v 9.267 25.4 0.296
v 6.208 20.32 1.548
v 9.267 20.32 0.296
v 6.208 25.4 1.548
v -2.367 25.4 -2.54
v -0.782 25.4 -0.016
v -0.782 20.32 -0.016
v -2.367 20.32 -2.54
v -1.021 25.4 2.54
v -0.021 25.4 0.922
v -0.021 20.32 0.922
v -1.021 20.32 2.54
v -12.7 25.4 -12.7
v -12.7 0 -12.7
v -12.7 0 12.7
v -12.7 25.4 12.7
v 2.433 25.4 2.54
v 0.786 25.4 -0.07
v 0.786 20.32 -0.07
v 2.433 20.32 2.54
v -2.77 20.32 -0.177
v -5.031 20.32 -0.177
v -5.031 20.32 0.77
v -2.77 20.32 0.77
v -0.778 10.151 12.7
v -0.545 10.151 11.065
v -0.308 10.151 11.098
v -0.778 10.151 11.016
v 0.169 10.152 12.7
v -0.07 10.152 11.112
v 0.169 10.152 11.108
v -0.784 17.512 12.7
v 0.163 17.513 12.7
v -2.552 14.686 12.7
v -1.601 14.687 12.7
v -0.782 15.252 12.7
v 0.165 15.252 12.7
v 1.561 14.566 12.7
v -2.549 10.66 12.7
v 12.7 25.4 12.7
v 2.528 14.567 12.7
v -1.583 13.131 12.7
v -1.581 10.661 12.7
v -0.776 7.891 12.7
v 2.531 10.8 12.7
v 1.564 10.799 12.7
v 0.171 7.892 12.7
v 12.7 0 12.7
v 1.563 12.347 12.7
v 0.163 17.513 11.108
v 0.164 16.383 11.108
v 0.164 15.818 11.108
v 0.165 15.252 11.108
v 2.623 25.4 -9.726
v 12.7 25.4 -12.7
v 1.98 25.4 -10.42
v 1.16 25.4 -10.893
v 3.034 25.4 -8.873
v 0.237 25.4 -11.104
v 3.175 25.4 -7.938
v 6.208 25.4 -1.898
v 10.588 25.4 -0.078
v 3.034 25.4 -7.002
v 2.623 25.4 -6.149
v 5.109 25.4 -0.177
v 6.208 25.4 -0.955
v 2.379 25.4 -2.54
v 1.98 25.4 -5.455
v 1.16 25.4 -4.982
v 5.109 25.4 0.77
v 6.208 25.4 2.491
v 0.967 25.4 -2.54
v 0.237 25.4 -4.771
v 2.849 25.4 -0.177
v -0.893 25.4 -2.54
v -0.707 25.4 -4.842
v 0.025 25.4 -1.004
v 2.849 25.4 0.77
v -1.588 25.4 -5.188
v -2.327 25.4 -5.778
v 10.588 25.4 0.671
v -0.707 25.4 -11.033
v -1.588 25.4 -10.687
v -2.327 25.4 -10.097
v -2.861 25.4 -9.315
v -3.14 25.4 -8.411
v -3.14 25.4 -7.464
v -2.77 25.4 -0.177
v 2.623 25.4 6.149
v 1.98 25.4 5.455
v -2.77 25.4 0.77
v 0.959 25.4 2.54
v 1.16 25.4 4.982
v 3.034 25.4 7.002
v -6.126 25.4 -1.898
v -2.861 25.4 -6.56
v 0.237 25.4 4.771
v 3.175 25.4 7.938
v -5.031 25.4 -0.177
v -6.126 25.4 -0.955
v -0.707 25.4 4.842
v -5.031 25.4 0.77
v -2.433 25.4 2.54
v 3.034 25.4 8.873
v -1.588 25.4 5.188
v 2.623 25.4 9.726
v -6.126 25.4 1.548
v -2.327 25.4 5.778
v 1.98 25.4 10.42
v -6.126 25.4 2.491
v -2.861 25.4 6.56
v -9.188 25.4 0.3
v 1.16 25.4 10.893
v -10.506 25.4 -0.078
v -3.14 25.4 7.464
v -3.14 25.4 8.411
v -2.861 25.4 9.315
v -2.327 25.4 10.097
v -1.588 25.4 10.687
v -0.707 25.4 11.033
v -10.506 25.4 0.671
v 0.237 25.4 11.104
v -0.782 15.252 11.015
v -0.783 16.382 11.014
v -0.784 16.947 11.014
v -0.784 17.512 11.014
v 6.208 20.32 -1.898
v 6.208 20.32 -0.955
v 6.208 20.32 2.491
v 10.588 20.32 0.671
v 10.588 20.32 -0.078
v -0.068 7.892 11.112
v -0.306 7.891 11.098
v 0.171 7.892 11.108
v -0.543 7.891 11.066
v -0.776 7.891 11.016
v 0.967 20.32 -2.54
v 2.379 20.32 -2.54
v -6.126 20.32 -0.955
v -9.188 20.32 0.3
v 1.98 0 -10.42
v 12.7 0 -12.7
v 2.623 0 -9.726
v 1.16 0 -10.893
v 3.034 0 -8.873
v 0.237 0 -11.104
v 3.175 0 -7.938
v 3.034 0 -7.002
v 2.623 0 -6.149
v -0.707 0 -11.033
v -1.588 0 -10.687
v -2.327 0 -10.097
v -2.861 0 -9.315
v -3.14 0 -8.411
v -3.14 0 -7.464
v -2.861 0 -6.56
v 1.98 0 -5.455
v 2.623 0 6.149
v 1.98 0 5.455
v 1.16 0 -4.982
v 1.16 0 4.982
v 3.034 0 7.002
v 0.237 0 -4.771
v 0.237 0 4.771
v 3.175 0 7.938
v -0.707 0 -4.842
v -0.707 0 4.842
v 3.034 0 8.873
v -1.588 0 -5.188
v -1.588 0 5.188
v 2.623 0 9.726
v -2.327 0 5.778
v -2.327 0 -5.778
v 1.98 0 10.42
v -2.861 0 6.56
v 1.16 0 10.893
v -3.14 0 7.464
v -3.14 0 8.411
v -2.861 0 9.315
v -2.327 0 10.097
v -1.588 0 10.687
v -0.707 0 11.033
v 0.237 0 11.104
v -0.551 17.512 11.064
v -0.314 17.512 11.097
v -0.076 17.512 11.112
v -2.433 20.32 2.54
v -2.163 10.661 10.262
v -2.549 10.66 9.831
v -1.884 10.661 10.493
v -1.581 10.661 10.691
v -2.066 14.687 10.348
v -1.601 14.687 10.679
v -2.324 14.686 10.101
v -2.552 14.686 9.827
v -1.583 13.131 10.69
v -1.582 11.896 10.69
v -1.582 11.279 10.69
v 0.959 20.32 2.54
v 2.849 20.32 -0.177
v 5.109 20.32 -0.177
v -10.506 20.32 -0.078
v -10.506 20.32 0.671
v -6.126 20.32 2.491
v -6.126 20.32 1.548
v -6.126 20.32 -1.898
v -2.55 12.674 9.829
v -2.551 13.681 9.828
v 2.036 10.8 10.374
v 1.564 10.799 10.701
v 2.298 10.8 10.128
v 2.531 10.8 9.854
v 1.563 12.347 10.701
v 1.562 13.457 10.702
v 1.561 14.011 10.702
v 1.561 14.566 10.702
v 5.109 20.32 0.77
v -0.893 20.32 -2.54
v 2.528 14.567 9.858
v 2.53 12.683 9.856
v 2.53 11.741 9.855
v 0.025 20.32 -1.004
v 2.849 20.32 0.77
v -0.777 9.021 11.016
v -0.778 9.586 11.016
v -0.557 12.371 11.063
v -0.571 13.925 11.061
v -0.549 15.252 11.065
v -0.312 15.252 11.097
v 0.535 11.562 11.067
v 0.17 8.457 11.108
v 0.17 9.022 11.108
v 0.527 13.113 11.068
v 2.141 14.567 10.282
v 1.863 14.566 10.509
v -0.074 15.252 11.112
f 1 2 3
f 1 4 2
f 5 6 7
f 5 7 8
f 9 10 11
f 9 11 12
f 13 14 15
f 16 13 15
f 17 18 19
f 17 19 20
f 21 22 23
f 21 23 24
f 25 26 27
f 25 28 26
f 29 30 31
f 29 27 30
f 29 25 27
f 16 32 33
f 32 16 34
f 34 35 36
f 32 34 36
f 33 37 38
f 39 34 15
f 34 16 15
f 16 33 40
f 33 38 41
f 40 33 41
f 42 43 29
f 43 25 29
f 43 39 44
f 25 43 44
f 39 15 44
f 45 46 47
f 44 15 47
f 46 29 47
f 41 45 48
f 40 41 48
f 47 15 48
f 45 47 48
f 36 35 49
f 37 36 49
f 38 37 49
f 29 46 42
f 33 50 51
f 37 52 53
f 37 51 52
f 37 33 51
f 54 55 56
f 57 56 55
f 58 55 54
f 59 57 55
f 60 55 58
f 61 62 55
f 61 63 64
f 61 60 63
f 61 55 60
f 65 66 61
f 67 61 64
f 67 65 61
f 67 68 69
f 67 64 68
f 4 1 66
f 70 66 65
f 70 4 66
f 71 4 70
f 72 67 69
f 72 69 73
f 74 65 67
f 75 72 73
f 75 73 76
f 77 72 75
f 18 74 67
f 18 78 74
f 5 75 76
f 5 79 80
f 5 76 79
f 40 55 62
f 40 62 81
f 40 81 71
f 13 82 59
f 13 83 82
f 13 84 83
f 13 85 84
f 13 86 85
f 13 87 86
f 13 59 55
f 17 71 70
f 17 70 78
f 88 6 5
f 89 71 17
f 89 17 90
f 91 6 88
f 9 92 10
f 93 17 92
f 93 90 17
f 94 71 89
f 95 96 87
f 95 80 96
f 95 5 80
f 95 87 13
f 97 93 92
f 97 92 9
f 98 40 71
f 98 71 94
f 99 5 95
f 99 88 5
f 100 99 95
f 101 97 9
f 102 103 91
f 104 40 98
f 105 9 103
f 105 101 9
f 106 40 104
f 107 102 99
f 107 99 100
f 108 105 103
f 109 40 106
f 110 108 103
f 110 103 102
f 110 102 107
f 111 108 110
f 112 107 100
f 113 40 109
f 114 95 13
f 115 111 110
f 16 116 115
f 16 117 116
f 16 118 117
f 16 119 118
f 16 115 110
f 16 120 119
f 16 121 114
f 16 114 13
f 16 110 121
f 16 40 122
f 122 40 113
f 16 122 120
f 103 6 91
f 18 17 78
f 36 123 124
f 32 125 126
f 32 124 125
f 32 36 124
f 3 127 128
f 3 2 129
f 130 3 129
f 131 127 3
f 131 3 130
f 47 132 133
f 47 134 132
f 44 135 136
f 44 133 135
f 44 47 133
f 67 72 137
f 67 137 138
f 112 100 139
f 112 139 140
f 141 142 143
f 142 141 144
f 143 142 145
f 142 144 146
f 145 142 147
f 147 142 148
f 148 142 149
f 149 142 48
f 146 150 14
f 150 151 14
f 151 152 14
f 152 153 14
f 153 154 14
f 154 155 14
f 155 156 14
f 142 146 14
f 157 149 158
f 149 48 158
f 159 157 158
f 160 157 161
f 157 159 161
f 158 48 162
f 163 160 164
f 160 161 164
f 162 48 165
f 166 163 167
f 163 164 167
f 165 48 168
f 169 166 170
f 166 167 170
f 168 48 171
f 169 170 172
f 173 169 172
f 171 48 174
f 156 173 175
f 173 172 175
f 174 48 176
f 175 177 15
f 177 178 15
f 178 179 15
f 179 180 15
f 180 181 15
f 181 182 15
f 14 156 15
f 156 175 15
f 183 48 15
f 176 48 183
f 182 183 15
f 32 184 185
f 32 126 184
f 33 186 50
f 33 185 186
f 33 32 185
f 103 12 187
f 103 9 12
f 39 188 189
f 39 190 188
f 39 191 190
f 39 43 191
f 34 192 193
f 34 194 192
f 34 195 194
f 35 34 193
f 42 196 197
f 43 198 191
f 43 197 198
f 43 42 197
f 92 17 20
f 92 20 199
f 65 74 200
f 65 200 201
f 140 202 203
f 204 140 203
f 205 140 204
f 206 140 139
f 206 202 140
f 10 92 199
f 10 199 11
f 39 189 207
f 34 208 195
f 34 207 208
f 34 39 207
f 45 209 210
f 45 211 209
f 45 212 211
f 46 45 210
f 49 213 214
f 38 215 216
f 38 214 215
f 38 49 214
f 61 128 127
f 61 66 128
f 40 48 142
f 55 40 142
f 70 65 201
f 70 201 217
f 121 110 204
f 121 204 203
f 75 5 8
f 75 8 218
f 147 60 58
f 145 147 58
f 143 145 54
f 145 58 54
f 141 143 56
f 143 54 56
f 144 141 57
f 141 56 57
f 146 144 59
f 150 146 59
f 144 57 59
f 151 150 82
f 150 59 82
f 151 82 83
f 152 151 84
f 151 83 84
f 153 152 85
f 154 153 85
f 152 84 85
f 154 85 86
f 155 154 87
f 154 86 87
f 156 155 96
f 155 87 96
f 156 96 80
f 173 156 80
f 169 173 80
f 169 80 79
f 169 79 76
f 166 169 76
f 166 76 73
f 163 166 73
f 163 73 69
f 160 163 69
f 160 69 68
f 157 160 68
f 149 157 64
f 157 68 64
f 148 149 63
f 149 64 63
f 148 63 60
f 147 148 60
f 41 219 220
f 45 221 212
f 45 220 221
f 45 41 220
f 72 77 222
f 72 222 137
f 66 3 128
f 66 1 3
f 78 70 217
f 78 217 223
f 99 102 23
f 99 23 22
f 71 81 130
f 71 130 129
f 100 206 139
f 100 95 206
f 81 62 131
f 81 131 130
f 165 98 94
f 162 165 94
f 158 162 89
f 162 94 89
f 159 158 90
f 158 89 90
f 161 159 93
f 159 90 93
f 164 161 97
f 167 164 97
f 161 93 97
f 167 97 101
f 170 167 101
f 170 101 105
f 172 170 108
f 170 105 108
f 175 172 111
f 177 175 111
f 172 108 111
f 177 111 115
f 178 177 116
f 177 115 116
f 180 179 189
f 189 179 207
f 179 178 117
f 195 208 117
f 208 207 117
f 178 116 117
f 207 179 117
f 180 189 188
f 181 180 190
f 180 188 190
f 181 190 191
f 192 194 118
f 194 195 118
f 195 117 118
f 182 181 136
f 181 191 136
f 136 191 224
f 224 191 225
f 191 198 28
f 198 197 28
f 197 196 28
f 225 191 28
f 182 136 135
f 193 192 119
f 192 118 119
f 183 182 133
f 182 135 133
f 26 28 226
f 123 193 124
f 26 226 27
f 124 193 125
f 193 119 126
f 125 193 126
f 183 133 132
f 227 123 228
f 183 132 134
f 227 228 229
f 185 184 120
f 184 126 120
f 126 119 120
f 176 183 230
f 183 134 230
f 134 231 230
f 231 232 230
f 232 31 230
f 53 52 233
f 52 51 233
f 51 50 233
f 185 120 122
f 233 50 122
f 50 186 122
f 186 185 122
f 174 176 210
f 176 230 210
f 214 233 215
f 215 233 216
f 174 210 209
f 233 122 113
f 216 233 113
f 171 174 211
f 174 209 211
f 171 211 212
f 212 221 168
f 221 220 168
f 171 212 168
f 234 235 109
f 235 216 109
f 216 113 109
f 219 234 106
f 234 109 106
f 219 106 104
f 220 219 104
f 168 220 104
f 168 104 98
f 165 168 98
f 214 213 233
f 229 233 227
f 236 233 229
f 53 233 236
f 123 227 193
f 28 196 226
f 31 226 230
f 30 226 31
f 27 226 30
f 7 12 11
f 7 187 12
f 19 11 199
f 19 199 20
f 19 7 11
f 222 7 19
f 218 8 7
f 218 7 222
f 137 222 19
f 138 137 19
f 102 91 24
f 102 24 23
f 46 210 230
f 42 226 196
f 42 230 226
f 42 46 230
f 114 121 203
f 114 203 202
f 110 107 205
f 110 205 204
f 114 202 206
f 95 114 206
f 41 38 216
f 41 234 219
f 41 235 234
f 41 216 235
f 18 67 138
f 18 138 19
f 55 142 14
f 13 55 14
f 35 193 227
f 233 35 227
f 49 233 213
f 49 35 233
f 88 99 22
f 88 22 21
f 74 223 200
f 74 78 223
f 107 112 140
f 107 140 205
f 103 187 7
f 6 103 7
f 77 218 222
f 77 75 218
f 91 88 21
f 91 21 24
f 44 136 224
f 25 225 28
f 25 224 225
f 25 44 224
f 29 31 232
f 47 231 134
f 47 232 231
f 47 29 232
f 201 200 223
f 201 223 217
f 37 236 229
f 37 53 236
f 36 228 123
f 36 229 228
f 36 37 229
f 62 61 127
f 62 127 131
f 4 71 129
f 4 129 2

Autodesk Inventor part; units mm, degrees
ref_plane "YZ Plane" through (0, 0, 0) normal (1, 0, 0) x (0, 1, 0)
ref_plane "XZ Plane" through (0, 0, 0) normal (0, 1, 0) x (-1, 0, 0)
ref_plane "XY Plane" through (0, 0, 0) normal (0, 0, 1) x (1, 0, 0)
sketch "Sketch1" plane through (0, 0, 0) normal (0, 1, 0) x (-1, 0, 0)
  line L0 (12.7, 12.7) -> (-12.7, 12.7)
  line L1 (-12.7, 12.7) -> (-12.7, -12.7)
  line L2 (-12.7, -12.7) -> (12.7, -12.7)
  line L3 (12.7, -12.7) -> (12.7, 12.7)
  line L4 (12.7, 12.7) -> (-12.7, -12.7) construction
  line L5 (-12.7, 12.7) -> (12.7, -12.7) construction
  point P0 (0, 0)
  dimension "d0" = 25.4
  dimension "d1" = 25.4
extrude "Extrusion1" add sketch "Sketch1" along normal blind 25.4
sketch "Sketch2" plane through (0, 25.4, 0) normal (0, 1, 0) x (1, 0, 0)
  line L0 (-12.7, 12.7) -> (-12.7, -12.7) construction
  line L1 (-12.7, 0) -> (12.7, 0) construction
  line L2 (12.7, -12.7) -> (12.7, 12.7) construction
  line L3 (-6.1256, -2.4906) -> (-10.5058, -0.671)
  line L4 (-10.5058, -0.671) -> (-10.5058, 0.0782)
  line L5 (-10.5058, 0.0782) -> (-6.1256, 1.8978)
  line L6 (-6.1256, 1.8978) -> (-6.1256, 0.9551)
  line L7 (-6.1256, 0.9551) -> (-9.1885, -0.3005)
  line L8 (-9.1885, -0.3005) -> (-6.1256, -1.5479)
  line L9 (-6.1256, -1.5479) -> (-6.1256, -2.4906)
  line L10 (-2.7705, -0.7698) -> (-5.0306, -0.7698)
  line L11 (-5.0306, -0.7698) -> (-5.0306, 0.177)
  line L12 (-5.0306, 0.177) -> (-2.7705, 0.177)
  line L13 (-2.7705, 0.177) -> (-2.7705, -0.7698)
  line L14 (2.433, -2.54) -> (0.9592, -2.54)
  line L15 (0.9592, -2.54) -> (-0.0206, -0.9221)
  line L16 (-0.0206, -0.9221) -> (-1.0209, -2.54)
  line L17 (-1.0209, -2.54) -> (-2.433, -2.54)
  line L18 (-2.433, -2.54) -> (-0.7822, 0.0165)
  line L19 (-0.7822, 0.0165) -> (-2.3671, 2.54)
  line L20 (-2.3671, 2.54) -> (-0.8933, 2.54)
  line L21 (-0.8933, 2.54) -> (0.0247, 1.0045)
  line L22 (0.0247, 1.0045) -> (0.9674, 2.54)
  line L23 (0.9674, 2.54) -> (2.3794, 2.54)
  line L24 (2.3794, 2.54) -> (0.7863, 0.07)
  line L25 (0.7863, 0.07) -> (2.433, -2.54)
  line L26 (5.1088, -0.7698) -> (2.8488, -0.7698)
  line L27 (2.8488, -0.7698) -> (2.8488, 0.177)
  line L28 (2.8488, 0.177) -> (5.1088, 0.177)
  line L29 (5.1088, 0.177) -> (5.1088, -0.7698)
  line L30 (10.5881, -0.671) -> (6.208, -2.4906)
  line L31 (6.208, -2.4906) -> (6.208, -1.5479)
  line L32 (6.208, -1.5479) -> (9.2667, -0.2964)
  line L33 (9.2667, -0.2964) -> (6.208, 0.9551)
  line L34 (6.208, 0.9551) -> (6.208, 1.8978)
  line L35 (6.208, 1.8978) -> (10.5881, 0.0782)
  line L36 (10.5881, 0.0782) -> (10.5881, -0.671)
  point P0 (0, 0)
extrude "Extrusion2" cut sketch "Sketch2" against normal blind 5.08
sketch "Sketch3" plane through (-12.7, 0, 12.7) normal (0, 0, 1) x (1, 0, 0)
  line L0 (12.6794, 25.4) -> (11.6791, 25.4) construction
  line L1 (12.7, 0) -> (12.6794, 25.4) construction
  line L2 (11.9178, 15.2517) -> (11.916, 17.5118)
  line L3 (11.916, 17.5118) -> (12.8628, 17.5126)
  line L4 (12.8628, 17.5126) -> (12.8647, 15.2525)
  line L5 (12.8647, 15.2525) -> (11.9178, 15.2517)
  line L6 (10.1514, 10.6602) -> (10.1481, 14.6863)
  line L7 (10.1481, 14.6863) -> (11.0991, 14.6871)
  line L8 (11.0991, 14.6871) -> (14.2626, 12.3472)
  line L9 (14.2626, 12.3472) -> (14.2608, 14.5661)
  line L10 (14.2608, 14.5661) -> (15.2282, 14.5669)
  line L11 (15.2282, 14.5669) -> (15.2312, 10.8001)
  line L12 (15.2312, 10.8001) -> (14.2638, 10.7994)
  line L13 (14.2638, 10.7994) -> (11.1168, 13.131)
  line L14 (11.1168, 13.131) -> (11.1188, 10.661)
  line L15 (11.1188, 10.661) -> (10.1514, 10.6602)
  line L16 (11.9238, 7.8911) -> (11.922, 10.1511)
  line L17 (11.922, 10.1511) -> (12.8688, 10.1519)
  line L18 (12.8688, 10.1519) -> (12.8706, 7.8918)
  line L19 (12.8706, 7.8918) -> (11.9238, 7.8911)
extrude "Extrusion3" cut sketch "Sketch3" against normal blind 5.08
sketch "Sketch11" plane through (0, 25.4, 0) normal (0, 1, 0) x (1, 0, 0)
  circle A0 centre (0, 7.9375) radius 3.175
  circle A1 centre (0, -7.9375) radius 3.175
  line L0 (12.7, 12.7) -> (-12.7, 12.7) projected
  line L1 (-12.7, -12.7) -> (12.7, -12.7) projected
  point P0 (0, 0)
  dimension "d81" = 6.35
  dimension "d82" = 4.7625
  dimension "d83" = 4.7625
extrude "Extrusion4" cut sketch "Sketch11" against normal blind 25.4
equation "\"d46\" = 0.125 * Sketch7_Pitch"
equation "\"Sketch7_Pitch\" = 1.27"
equation "\"d48\" = 60deg"
equation "\"d67\" = 0.125 * Sketch9_Pitch"
equation "\"Sketch9_Pitch\" = 1.27"
equation "\"d69\" = 60deg"
equation "\"d99\" = 0.125 * Sketch12_Pitch"
equation "\"Sketch12_Pitch\" = 1.27"
equation "\"d101\" = 60deg"
equation "\"d120\" = 0.125 * Sketch14_Pitch"
equation "\"Sketch14_Pitch\" = 1.27"
equation "\"d122\" = 60deg"
equation "\"d143\" = 55deg"
equation "\"Sketch16_Pitch\" = 1.27"
equation "\"d161\" = 55deg"
equation "\"Sketch18_Pitch\" = 1.27"
properties part number "squareCalibrationBlock-1in"
